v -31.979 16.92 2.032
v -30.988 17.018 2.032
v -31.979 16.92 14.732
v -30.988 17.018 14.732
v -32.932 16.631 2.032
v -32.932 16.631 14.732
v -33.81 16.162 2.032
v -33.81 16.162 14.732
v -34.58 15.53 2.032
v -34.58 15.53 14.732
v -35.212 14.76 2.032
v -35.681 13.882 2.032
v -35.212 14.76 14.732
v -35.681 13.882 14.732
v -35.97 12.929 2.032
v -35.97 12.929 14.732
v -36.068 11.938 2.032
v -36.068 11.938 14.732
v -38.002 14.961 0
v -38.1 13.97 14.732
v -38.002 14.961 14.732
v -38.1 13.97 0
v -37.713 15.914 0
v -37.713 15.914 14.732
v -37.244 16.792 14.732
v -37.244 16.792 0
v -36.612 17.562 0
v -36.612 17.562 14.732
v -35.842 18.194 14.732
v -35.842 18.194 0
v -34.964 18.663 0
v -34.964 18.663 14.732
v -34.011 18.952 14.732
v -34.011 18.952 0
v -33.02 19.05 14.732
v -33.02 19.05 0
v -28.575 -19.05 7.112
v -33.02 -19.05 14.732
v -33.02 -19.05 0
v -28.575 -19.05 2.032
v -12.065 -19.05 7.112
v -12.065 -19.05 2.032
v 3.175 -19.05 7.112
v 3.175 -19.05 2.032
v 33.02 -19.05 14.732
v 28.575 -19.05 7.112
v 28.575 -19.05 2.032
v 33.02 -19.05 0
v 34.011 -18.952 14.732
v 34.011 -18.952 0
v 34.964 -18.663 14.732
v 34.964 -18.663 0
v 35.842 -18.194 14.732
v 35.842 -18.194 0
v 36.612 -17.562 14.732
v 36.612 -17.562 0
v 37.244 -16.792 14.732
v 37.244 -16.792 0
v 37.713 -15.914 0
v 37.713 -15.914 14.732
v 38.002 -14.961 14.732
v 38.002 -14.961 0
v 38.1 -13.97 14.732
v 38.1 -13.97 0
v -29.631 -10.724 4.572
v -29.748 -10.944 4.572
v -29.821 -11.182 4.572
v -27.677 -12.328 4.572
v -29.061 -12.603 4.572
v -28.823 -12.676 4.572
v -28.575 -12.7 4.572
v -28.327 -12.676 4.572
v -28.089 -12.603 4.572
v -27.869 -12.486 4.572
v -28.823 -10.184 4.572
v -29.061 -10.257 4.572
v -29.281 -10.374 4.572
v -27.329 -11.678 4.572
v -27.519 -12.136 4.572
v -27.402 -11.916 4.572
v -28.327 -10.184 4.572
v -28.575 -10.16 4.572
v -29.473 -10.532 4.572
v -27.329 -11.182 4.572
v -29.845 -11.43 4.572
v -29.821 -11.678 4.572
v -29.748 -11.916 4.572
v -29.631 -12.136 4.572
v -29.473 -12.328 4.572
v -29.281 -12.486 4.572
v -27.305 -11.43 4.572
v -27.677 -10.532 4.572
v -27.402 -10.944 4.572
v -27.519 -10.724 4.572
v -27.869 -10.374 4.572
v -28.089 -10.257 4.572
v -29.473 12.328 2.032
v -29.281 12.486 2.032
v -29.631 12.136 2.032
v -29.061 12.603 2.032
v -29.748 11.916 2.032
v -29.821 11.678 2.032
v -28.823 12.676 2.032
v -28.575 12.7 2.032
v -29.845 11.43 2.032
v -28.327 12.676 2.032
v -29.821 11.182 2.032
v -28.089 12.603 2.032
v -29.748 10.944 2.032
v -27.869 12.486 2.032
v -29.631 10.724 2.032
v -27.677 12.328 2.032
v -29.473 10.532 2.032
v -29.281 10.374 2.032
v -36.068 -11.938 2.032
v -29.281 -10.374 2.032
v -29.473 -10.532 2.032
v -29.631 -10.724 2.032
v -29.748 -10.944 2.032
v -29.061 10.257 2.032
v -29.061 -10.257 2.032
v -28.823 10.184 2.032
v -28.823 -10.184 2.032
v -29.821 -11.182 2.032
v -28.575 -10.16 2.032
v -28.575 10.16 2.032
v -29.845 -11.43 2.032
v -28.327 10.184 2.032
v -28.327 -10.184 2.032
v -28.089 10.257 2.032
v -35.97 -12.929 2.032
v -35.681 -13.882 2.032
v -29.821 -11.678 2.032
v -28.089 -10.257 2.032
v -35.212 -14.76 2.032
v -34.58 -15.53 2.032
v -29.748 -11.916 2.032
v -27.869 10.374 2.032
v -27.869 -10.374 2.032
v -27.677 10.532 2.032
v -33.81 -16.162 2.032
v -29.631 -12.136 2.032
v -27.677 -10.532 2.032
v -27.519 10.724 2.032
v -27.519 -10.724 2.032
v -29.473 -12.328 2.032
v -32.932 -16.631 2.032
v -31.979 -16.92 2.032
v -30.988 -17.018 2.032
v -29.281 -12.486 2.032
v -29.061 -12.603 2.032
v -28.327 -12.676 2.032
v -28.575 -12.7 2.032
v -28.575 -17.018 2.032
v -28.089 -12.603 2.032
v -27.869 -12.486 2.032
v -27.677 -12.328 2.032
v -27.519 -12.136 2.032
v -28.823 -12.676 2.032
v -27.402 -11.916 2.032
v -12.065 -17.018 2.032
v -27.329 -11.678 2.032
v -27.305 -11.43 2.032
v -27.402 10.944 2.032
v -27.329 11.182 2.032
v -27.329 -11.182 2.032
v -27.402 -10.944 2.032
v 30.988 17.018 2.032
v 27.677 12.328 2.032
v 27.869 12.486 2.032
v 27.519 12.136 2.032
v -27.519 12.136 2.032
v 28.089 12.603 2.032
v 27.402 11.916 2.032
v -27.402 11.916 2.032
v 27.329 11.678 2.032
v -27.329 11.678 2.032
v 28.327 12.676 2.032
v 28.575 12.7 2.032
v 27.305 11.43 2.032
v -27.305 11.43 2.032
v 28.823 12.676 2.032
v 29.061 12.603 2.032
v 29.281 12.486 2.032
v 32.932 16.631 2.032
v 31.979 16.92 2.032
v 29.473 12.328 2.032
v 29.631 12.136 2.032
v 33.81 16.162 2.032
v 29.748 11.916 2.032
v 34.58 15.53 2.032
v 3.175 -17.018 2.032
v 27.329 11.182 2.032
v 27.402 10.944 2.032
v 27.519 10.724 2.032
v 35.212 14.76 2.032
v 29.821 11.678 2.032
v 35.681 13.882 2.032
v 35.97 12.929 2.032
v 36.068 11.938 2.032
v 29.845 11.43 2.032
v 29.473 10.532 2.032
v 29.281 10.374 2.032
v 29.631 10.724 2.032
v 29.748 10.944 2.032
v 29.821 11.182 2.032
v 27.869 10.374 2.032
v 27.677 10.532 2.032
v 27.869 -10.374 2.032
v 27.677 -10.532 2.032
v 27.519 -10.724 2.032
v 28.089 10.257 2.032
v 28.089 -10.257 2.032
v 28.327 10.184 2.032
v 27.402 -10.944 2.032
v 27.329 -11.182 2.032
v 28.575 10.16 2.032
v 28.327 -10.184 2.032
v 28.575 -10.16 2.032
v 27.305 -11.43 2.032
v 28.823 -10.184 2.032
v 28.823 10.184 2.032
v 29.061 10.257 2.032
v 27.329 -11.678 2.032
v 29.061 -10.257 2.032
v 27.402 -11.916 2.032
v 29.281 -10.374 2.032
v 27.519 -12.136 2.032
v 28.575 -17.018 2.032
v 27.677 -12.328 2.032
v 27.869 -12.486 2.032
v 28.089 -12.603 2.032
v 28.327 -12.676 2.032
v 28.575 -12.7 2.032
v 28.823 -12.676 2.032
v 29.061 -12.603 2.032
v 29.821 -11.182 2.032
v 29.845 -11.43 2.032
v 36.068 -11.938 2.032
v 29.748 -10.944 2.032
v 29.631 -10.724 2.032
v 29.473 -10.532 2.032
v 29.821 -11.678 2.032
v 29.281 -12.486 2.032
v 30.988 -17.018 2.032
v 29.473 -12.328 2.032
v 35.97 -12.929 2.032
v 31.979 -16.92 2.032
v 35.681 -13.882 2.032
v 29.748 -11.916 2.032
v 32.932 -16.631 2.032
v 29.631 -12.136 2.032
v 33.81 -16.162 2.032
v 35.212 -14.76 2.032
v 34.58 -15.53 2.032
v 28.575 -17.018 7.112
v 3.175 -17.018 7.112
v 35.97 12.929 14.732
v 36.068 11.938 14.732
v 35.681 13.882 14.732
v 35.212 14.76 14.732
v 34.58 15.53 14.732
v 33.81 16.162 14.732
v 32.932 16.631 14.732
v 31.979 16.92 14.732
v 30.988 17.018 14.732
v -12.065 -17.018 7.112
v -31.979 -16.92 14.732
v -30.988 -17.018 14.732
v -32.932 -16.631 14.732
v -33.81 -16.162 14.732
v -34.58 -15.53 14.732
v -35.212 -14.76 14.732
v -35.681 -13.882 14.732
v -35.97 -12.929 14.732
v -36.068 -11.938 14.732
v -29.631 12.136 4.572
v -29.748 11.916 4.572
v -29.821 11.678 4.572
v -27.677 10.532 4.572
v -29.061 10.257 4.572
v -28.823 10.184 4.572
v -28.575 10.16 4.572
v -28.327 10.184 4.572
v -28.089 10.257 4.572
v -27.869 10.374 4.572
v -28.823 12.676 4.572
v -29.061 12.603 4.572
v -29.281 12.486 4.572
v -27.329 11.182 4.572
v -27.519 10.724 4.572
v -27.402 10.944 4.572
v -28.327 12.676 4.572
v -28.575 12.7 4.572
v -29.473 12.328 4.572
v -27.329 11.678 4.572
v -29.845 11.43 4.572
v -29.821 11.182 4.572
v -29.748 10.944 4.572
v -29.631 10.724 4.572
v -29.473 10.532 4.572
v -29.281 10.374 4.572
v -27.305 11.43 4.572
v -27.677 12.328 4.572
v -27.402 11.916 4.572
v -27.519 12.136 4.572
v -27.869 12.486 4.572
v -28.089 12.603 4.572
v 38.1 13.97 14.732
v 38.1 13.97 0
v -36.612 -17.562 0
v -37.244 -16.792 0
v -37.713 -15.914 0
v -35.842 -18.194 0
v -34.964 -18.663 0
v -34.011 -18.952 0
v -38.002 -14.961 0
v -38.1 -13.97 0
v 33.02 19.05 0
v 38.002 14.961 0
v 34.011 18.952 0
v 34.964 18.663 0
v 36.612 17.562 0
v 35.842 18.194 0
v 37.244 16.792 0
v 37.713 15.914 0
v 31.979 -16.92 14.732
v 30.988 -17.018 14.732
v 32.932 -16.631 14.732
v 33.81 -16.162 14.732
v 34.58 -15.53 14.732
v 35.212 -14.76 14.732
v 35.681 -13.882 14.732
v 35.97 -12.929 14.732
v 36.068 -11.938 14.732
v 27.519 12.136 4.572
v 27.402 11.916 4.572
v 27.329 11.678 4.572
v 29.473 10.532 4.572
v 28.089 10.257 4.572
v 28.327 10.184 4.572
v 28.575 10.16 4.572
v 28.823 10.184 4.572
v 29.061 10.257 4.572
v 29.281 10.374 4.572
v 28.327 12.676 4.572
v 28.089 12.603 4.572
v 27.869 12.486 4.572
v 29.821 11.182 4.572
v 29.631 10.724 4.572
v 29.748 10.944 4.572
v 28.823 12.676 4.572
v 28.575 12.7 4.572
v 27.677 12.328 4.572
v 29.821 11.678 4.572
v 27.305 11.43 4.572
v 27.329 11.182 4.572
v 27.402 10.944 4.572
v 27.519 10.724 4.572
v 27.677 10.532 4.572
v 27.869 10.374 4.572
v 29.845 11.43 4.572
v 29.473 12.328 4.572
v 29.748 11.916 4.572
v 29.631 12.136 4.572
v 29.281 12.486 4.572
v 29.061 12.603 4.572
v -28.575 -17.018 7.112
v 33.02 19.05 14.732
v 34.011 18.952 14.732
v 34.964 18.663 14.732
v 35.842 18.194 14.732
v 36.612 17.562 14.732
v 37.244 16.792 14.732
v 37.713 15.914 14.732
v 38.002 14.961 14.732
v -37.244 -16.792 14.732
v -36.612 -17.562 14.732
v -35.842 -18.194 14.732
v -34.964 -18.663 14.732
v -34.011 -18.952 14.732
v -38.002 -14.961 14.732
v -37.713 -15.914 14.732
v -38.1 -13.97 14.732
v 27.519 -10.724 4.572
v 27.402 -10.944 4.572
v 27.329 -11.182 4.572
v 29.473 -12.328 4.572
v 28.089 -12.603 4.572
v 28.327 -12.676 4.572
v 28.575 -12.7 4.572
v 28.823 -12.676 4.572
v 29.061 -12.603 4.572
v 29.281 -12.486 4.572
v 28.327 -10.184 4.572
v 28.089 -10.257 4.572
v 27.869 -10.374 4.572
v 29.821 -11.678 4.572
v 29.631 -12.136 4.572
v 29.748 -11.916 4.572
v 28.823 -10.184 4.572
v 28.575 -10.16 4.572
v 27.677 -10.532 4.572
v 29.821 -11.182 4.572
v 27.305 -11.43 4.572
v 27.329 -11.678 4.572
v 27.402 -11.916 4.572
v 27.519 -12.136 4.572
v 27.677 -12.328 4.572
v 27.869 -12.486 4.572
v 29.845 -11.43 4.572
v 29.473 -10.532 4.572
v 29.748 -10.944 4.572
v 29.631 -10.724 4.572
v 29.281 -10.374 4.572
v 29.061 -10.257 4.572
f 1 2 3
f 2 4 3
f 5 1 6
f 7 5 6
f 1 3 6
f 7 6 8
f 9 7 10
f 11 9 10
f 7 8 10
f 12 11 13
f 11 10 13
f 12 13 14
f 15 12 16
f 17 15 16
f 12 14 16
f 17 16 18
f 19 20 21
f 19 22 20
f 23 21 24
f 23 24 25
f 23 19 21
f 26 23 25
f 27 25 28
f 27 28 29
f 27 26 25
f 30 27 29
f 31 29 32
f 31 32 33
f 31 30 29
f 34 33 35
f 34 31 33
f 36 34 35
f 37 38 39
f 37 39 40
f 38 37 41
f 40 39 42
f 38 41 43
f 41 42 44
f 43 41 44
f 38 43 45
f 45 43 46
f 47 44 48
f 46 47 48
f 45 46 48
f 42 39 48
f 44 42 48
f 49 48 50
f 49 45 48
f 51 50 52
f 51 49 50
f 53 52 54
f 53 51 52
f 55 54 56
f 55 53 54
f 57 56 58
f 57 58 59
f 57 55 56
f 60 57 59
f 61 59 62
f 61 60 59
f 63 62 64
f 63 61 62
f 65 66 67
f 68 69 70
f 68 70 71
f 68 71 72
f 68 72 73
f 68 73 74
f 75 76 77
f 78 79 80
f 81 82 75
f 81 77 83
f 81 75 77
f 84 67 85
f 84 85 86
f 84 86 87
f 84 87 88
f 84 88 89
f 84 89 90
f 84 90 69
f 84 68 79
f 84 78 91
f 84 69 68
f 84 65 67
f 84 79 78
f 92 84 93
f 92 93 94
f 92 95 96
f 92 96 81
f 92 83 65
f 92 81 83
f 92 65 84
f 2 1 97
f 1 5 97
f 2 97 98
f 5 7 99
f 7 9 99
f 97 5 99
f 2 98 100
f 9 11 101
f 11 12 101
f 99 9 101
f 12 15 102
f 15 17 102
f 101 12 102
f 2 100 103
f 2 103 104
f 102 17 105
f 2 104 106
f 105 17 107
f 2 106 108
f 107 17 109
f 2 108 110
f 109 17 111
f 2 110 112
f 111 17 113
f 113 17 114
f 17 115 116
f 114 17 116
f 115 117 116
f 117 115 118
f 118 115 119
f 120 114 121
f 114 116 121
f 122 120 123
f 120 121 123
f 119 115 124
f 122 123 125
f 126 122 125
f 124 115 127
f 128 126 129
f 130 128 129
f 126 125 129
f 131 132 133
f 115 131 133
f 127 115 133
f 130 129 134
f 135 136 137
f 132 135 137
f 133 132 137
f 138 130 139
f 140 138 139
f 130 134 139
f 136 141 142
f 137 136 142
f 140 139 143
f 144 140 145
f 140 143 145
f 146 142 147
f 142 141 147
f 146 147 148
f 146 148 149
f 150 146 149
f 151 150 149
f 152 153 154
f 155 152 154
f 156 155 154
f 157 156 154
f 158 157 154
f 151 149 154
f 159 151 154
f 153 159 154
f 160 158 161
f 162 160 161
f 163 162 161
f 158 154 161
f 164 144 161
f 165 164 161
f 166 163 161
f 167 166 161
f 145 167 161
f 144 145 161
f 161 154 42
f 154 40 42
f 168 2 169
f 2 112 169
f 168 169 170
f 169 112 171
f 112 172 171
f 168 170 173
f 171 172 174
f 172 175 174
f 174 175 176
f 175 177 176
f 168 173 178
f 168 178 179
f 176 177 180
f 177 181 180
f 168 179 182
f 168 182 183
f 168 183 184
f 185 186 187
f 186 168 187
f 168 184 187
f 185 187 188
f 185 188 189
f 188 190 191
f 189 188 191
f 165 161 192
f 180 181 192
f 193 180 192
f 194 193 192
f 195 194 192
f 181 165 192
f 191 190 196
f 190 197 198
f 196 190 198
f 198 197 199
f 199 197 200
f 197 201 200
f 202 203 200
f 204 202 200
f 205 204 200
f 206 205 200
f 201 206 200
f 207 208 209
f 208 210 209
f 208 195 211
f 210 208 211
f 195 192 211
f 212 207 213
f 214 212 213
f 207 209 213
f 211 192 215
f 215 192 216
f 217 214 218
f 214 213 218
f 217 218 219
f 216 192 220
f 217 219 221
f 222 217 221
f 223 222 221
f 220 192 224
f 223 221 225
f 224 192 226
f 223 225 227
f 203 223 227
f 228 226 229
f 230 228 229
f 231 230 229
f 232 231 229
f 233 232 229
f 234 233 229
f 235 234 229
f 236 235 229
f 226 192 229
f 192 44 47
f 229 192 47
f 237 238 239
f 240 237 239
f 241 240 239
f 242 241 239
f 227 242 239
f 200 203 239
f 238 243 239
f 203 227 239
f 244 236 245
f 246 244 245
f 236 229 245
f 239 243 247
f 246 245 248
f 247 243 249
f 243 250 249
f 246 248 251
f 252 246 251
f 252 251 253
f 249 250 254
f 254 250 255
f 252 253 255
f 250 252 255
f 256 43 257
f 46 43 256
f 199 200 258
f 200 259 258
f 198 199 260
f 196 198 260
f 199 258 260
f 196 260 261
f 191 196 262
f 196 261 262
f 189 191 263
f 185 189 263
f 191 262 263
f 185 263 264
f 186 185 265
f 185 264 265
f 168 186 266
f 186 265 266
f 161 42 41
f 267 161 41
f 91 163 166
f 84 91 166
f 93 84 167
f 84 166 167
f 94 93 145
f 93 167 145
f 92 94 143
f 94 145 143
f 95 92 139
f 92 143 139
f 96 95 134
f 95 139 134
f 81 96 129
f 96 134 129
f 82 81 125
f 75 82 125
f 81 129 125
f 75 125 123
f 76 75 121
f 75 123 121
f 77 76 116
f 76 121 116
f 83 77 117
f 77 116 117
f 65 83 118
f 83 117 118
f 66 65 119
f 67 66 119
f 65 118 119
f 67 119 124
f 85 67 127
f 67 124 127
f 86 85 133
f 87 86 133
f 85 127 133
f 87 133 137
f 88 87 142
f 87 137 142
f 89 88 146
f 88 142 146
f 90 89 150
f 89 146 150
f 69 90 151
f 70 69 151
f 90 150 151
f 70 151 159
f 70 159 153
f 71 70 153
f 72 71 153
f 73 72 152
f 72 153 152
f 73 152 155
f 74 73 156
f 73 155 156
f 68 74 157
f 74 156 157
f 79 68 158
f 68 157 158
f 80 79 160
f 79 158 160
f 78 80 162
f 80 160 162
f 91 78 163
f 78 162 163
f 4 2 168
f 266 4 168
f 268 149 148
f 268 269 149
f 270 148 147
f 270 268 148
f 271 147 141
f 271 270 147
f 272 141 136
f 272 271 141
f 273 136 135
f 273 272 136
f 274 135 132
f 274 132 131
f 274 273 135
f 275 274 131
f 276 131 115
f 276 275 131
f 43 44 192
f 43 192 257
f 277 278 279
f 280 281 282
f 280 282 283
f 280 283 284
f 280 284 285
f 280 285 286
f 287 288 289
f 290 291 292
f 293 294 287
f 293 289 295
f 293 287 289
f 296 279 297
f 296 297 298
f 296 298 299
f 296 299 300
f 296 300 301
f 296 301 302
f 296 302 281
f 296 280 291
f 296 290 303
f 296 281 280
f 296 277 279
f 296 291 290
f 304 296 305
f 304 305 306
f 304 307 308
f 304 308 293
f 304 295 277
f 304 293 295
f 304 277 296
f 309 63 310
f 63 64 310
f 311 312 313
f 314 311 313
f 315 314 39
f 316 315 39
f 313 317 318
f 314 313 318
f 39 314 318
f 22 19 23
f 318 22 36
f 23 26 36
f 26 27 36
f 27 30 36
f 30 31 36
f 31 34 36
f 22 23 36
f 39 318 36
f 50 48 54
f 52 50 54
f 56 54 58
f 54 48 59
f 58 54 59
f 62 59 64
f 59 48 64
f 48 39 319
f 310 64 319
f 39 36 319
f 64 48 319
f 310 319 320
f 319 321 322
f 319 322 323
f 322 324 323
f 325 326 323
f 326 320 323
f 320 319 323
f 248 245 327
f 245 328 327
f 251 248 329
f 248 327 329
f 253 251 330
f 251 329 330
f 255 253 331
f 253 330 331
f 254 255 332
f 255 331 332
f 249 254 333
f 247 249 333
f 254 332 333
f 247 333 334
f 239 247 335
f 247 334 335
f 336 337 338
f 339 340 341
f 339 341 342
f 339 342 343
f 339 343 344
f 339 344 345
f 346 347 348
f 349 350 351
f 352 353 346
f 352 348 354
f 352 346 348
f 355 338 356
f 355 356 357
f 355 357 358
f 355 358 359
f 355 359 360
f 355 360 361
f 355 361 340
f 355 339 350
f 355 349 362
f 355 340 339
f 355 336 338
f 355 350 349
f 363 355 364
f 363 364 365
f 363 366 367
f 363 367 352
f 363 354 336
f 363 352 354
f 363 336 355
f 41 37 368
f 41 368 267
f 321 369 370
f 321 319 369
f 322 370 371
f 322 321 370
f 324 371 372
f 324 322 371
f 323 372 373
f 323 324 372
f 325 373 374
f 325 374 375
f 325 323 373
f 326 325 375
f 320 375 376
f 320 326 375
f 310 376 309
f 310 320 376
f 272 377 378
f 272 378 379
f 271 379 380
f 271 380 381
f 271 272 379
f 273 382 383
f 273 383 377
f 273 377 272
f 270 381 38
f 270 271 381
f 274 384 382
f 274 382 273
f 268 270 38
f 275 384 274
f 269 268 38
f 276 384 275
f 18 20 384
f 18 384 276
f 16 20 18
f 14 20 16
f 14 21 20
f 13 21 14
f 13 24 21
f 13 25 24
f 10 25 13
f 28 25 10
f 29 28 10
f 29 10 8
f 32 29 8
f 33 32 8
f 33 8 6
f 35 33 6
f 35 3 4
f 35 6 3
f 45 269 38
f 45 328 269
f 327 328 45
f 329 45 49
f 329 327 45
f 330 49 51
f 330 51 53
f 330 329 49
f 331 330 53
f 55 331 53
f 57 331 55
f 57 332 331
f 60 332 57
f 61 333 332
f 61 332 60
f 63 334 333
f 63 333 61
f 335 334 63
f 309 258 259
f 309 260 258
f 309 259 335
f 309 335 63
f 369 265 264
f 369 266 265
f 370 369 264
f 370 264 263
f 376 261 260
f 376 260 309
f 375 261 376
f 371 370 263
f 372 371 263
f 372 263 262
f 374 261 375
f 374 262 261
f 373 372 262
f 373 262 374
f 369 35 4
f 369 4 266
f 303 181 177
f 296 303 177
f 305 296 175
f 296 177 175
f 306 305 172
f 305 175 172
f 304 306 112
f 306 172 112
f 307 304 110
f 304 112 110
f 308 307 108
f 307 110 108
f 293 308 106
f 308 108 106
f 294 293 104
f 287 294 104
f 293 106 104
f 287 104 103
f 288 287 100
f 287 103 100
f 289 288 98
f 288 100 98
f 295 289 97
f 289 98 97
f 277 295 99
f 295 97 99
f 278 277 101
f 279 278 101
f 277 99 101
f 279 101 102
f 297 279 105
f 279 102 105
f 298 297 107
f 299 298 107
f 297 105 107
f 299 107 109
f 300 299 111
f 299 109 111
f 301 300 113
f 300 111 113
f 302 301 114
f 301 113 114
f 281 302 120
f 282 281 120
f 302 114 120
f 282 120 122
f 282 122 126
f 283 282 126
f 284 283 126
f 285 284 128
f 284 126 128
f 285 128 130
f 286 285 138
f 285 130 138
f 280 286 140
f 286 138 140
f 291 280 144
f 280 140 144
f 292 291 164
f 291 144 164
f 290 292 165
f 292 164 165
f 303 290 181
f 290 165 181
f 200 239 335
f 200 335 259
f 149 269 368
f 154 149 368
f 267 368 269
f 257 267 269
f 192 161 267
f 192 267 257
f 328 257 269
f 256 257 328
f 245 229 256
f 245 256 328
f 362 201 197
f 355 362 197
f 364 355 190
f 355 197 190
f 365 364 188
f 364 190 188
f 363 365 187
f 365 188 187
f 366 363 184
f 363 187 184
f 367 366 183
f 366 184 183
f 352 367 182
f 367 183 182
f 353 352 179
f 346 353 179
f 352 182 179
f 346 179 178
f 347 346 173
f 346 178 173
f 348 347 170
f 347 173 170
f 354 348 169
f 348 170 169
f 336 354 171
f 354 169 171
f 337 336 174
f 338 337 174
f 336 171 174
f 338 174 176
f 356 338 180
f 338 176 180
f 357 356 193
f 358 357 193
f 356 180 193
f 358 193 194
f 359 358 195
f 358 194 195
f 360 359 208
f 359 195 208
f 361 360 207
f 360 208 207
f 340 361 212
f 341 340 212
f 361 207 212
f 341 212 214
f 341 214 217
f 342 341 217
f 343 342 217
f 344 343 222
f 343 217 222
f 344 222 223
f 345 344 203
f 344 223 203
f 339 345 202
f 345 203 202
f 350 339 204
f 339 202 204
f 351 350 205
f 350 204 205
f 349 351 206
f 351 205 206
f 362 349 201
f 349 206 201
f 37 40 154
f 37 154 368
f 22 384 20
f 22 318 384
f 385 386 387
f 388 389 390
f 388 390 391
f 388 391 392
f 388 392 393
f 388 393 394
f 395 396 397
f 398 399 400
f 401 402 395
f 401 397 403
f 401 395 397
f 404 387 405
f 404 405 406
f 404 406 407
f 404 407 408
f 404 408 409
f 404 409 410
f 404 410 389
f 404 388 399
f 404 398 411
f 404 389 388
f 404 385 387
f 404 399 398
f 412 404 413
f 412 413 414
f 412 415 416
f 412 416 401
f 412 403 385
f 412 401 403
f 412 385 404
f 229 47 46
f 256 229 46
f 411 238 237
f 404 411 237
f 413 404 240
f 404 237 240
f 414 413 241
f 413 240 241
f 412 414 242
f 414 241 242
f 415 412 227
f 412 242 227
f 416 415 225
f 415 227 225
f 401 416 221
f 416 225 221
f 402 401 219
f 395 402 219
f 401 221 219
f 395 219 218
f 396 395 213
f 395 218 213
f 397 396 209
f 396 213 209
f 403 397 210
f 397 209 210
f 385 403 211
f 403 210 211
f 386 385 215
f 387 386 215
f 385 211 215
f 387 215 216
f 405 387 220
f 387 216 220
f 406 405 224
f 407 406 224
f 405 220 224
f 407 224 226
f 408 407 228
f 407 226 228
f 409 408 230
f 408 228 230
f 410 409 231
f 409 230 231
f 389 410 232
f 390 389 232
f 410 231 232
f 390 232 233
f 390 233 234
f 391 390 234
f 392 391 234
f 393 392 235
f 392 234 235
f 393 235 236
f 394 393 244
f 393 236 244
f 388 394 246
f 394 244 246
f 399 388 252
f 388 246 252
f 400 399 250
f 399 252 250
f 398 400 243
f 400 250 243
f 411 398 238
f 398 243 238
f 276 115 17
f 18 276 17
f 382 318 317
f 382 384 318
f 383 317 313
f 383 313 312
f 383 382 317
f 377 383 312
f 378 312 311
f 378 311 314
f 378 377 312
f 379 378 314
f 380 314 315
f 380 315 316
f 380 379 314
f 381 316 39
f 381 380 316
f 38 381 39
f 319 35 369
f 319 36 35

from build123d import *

# Parameters (mm, degrees)
F0_W     = 76.2
F0_H     = 38.1
F1_DEPTH = 2.032
F2_W     = 76.2
F2_H     = 38.1
F2_W_2   = 72.136
F2_H_2   = 34.036
F3_DEPTH = 12.7
F4_R     = 1.27
F5_DEPTH = 2.54
F6_W     = 16.51
F6_H     = 5.08
F6_W_2   = 25.4
F7_DEPTH = 2.032
F8_R     = 5.08
F9_R     = 5.08


with BuildPart() as f1:
    # F0 (on Top) → F1 (new body)
    with BuildSketch(Plane.XY):
        Rectangle(F0_W, F0_H)
    extrude(amount=F1_DEPTH)

    # F2 (on face) → F3 (join)
    with BuildSketch(Plane.XY.offset(2.032)):
        Rectangle(F2_W, F2_H)
        Rectangle(F2_W_2, F2_H_2, mode=Mode.SUBTRACT)
    extrude(amount=F3_DEPTH)

    # F4 (on face) → F5 (join)
    with BuildSketch(Plane.XY.offset(2.032)):
        with Locations((-28.575, 11.43)):
            Circle(F4_R)
        with Locations((-28.575, -11.43)):
            Circle(F4_R)
        with Locations((28.575, -11.43)):
            Circle(F4_R)
        with Locations((28.575, 11.43)):
            Circle(F4_R)
    extrude(amount=F5_DEPTH)

    # F6 (on face) → F7 (cut)
    with BuildSketch(Plane.XZ.offset(19.05)):
        with Locations((-20.32, 4.572)):
            Rectangle(F6_W, F6_H)
        with Locations((15.875, 4.572)):
            Rectangle(F6_W_2, F6_H)
    extrude(amount=-F7_DEPTH, mode=Mode.SUBTRACT)

    # F8
    f8_edges = [f1.edges().sort_by_distance(p)[0] for p in [
        (-36.068, 17.018, 8.382),
        (-36.068, -17.018, 8.382),
        (36.068, 17.018, 8.382),
        (36.068, -17.018, 8.382),
    ]]
    fillet(f8_edges, radius=F8_R)

    # F9
    f9_edges = [f1.edges().sort_by_distance(p)[0] for p in [
        (-38.1, -19.05, 7.366),
        (38.1, -19.05, 7.366),
        (38.1, 19.05, 7.366),
        (-38.1, 19.05, 7.366),
    ]]
    fillet(f9_edges, radius=F9_R)


solid = f1.part
